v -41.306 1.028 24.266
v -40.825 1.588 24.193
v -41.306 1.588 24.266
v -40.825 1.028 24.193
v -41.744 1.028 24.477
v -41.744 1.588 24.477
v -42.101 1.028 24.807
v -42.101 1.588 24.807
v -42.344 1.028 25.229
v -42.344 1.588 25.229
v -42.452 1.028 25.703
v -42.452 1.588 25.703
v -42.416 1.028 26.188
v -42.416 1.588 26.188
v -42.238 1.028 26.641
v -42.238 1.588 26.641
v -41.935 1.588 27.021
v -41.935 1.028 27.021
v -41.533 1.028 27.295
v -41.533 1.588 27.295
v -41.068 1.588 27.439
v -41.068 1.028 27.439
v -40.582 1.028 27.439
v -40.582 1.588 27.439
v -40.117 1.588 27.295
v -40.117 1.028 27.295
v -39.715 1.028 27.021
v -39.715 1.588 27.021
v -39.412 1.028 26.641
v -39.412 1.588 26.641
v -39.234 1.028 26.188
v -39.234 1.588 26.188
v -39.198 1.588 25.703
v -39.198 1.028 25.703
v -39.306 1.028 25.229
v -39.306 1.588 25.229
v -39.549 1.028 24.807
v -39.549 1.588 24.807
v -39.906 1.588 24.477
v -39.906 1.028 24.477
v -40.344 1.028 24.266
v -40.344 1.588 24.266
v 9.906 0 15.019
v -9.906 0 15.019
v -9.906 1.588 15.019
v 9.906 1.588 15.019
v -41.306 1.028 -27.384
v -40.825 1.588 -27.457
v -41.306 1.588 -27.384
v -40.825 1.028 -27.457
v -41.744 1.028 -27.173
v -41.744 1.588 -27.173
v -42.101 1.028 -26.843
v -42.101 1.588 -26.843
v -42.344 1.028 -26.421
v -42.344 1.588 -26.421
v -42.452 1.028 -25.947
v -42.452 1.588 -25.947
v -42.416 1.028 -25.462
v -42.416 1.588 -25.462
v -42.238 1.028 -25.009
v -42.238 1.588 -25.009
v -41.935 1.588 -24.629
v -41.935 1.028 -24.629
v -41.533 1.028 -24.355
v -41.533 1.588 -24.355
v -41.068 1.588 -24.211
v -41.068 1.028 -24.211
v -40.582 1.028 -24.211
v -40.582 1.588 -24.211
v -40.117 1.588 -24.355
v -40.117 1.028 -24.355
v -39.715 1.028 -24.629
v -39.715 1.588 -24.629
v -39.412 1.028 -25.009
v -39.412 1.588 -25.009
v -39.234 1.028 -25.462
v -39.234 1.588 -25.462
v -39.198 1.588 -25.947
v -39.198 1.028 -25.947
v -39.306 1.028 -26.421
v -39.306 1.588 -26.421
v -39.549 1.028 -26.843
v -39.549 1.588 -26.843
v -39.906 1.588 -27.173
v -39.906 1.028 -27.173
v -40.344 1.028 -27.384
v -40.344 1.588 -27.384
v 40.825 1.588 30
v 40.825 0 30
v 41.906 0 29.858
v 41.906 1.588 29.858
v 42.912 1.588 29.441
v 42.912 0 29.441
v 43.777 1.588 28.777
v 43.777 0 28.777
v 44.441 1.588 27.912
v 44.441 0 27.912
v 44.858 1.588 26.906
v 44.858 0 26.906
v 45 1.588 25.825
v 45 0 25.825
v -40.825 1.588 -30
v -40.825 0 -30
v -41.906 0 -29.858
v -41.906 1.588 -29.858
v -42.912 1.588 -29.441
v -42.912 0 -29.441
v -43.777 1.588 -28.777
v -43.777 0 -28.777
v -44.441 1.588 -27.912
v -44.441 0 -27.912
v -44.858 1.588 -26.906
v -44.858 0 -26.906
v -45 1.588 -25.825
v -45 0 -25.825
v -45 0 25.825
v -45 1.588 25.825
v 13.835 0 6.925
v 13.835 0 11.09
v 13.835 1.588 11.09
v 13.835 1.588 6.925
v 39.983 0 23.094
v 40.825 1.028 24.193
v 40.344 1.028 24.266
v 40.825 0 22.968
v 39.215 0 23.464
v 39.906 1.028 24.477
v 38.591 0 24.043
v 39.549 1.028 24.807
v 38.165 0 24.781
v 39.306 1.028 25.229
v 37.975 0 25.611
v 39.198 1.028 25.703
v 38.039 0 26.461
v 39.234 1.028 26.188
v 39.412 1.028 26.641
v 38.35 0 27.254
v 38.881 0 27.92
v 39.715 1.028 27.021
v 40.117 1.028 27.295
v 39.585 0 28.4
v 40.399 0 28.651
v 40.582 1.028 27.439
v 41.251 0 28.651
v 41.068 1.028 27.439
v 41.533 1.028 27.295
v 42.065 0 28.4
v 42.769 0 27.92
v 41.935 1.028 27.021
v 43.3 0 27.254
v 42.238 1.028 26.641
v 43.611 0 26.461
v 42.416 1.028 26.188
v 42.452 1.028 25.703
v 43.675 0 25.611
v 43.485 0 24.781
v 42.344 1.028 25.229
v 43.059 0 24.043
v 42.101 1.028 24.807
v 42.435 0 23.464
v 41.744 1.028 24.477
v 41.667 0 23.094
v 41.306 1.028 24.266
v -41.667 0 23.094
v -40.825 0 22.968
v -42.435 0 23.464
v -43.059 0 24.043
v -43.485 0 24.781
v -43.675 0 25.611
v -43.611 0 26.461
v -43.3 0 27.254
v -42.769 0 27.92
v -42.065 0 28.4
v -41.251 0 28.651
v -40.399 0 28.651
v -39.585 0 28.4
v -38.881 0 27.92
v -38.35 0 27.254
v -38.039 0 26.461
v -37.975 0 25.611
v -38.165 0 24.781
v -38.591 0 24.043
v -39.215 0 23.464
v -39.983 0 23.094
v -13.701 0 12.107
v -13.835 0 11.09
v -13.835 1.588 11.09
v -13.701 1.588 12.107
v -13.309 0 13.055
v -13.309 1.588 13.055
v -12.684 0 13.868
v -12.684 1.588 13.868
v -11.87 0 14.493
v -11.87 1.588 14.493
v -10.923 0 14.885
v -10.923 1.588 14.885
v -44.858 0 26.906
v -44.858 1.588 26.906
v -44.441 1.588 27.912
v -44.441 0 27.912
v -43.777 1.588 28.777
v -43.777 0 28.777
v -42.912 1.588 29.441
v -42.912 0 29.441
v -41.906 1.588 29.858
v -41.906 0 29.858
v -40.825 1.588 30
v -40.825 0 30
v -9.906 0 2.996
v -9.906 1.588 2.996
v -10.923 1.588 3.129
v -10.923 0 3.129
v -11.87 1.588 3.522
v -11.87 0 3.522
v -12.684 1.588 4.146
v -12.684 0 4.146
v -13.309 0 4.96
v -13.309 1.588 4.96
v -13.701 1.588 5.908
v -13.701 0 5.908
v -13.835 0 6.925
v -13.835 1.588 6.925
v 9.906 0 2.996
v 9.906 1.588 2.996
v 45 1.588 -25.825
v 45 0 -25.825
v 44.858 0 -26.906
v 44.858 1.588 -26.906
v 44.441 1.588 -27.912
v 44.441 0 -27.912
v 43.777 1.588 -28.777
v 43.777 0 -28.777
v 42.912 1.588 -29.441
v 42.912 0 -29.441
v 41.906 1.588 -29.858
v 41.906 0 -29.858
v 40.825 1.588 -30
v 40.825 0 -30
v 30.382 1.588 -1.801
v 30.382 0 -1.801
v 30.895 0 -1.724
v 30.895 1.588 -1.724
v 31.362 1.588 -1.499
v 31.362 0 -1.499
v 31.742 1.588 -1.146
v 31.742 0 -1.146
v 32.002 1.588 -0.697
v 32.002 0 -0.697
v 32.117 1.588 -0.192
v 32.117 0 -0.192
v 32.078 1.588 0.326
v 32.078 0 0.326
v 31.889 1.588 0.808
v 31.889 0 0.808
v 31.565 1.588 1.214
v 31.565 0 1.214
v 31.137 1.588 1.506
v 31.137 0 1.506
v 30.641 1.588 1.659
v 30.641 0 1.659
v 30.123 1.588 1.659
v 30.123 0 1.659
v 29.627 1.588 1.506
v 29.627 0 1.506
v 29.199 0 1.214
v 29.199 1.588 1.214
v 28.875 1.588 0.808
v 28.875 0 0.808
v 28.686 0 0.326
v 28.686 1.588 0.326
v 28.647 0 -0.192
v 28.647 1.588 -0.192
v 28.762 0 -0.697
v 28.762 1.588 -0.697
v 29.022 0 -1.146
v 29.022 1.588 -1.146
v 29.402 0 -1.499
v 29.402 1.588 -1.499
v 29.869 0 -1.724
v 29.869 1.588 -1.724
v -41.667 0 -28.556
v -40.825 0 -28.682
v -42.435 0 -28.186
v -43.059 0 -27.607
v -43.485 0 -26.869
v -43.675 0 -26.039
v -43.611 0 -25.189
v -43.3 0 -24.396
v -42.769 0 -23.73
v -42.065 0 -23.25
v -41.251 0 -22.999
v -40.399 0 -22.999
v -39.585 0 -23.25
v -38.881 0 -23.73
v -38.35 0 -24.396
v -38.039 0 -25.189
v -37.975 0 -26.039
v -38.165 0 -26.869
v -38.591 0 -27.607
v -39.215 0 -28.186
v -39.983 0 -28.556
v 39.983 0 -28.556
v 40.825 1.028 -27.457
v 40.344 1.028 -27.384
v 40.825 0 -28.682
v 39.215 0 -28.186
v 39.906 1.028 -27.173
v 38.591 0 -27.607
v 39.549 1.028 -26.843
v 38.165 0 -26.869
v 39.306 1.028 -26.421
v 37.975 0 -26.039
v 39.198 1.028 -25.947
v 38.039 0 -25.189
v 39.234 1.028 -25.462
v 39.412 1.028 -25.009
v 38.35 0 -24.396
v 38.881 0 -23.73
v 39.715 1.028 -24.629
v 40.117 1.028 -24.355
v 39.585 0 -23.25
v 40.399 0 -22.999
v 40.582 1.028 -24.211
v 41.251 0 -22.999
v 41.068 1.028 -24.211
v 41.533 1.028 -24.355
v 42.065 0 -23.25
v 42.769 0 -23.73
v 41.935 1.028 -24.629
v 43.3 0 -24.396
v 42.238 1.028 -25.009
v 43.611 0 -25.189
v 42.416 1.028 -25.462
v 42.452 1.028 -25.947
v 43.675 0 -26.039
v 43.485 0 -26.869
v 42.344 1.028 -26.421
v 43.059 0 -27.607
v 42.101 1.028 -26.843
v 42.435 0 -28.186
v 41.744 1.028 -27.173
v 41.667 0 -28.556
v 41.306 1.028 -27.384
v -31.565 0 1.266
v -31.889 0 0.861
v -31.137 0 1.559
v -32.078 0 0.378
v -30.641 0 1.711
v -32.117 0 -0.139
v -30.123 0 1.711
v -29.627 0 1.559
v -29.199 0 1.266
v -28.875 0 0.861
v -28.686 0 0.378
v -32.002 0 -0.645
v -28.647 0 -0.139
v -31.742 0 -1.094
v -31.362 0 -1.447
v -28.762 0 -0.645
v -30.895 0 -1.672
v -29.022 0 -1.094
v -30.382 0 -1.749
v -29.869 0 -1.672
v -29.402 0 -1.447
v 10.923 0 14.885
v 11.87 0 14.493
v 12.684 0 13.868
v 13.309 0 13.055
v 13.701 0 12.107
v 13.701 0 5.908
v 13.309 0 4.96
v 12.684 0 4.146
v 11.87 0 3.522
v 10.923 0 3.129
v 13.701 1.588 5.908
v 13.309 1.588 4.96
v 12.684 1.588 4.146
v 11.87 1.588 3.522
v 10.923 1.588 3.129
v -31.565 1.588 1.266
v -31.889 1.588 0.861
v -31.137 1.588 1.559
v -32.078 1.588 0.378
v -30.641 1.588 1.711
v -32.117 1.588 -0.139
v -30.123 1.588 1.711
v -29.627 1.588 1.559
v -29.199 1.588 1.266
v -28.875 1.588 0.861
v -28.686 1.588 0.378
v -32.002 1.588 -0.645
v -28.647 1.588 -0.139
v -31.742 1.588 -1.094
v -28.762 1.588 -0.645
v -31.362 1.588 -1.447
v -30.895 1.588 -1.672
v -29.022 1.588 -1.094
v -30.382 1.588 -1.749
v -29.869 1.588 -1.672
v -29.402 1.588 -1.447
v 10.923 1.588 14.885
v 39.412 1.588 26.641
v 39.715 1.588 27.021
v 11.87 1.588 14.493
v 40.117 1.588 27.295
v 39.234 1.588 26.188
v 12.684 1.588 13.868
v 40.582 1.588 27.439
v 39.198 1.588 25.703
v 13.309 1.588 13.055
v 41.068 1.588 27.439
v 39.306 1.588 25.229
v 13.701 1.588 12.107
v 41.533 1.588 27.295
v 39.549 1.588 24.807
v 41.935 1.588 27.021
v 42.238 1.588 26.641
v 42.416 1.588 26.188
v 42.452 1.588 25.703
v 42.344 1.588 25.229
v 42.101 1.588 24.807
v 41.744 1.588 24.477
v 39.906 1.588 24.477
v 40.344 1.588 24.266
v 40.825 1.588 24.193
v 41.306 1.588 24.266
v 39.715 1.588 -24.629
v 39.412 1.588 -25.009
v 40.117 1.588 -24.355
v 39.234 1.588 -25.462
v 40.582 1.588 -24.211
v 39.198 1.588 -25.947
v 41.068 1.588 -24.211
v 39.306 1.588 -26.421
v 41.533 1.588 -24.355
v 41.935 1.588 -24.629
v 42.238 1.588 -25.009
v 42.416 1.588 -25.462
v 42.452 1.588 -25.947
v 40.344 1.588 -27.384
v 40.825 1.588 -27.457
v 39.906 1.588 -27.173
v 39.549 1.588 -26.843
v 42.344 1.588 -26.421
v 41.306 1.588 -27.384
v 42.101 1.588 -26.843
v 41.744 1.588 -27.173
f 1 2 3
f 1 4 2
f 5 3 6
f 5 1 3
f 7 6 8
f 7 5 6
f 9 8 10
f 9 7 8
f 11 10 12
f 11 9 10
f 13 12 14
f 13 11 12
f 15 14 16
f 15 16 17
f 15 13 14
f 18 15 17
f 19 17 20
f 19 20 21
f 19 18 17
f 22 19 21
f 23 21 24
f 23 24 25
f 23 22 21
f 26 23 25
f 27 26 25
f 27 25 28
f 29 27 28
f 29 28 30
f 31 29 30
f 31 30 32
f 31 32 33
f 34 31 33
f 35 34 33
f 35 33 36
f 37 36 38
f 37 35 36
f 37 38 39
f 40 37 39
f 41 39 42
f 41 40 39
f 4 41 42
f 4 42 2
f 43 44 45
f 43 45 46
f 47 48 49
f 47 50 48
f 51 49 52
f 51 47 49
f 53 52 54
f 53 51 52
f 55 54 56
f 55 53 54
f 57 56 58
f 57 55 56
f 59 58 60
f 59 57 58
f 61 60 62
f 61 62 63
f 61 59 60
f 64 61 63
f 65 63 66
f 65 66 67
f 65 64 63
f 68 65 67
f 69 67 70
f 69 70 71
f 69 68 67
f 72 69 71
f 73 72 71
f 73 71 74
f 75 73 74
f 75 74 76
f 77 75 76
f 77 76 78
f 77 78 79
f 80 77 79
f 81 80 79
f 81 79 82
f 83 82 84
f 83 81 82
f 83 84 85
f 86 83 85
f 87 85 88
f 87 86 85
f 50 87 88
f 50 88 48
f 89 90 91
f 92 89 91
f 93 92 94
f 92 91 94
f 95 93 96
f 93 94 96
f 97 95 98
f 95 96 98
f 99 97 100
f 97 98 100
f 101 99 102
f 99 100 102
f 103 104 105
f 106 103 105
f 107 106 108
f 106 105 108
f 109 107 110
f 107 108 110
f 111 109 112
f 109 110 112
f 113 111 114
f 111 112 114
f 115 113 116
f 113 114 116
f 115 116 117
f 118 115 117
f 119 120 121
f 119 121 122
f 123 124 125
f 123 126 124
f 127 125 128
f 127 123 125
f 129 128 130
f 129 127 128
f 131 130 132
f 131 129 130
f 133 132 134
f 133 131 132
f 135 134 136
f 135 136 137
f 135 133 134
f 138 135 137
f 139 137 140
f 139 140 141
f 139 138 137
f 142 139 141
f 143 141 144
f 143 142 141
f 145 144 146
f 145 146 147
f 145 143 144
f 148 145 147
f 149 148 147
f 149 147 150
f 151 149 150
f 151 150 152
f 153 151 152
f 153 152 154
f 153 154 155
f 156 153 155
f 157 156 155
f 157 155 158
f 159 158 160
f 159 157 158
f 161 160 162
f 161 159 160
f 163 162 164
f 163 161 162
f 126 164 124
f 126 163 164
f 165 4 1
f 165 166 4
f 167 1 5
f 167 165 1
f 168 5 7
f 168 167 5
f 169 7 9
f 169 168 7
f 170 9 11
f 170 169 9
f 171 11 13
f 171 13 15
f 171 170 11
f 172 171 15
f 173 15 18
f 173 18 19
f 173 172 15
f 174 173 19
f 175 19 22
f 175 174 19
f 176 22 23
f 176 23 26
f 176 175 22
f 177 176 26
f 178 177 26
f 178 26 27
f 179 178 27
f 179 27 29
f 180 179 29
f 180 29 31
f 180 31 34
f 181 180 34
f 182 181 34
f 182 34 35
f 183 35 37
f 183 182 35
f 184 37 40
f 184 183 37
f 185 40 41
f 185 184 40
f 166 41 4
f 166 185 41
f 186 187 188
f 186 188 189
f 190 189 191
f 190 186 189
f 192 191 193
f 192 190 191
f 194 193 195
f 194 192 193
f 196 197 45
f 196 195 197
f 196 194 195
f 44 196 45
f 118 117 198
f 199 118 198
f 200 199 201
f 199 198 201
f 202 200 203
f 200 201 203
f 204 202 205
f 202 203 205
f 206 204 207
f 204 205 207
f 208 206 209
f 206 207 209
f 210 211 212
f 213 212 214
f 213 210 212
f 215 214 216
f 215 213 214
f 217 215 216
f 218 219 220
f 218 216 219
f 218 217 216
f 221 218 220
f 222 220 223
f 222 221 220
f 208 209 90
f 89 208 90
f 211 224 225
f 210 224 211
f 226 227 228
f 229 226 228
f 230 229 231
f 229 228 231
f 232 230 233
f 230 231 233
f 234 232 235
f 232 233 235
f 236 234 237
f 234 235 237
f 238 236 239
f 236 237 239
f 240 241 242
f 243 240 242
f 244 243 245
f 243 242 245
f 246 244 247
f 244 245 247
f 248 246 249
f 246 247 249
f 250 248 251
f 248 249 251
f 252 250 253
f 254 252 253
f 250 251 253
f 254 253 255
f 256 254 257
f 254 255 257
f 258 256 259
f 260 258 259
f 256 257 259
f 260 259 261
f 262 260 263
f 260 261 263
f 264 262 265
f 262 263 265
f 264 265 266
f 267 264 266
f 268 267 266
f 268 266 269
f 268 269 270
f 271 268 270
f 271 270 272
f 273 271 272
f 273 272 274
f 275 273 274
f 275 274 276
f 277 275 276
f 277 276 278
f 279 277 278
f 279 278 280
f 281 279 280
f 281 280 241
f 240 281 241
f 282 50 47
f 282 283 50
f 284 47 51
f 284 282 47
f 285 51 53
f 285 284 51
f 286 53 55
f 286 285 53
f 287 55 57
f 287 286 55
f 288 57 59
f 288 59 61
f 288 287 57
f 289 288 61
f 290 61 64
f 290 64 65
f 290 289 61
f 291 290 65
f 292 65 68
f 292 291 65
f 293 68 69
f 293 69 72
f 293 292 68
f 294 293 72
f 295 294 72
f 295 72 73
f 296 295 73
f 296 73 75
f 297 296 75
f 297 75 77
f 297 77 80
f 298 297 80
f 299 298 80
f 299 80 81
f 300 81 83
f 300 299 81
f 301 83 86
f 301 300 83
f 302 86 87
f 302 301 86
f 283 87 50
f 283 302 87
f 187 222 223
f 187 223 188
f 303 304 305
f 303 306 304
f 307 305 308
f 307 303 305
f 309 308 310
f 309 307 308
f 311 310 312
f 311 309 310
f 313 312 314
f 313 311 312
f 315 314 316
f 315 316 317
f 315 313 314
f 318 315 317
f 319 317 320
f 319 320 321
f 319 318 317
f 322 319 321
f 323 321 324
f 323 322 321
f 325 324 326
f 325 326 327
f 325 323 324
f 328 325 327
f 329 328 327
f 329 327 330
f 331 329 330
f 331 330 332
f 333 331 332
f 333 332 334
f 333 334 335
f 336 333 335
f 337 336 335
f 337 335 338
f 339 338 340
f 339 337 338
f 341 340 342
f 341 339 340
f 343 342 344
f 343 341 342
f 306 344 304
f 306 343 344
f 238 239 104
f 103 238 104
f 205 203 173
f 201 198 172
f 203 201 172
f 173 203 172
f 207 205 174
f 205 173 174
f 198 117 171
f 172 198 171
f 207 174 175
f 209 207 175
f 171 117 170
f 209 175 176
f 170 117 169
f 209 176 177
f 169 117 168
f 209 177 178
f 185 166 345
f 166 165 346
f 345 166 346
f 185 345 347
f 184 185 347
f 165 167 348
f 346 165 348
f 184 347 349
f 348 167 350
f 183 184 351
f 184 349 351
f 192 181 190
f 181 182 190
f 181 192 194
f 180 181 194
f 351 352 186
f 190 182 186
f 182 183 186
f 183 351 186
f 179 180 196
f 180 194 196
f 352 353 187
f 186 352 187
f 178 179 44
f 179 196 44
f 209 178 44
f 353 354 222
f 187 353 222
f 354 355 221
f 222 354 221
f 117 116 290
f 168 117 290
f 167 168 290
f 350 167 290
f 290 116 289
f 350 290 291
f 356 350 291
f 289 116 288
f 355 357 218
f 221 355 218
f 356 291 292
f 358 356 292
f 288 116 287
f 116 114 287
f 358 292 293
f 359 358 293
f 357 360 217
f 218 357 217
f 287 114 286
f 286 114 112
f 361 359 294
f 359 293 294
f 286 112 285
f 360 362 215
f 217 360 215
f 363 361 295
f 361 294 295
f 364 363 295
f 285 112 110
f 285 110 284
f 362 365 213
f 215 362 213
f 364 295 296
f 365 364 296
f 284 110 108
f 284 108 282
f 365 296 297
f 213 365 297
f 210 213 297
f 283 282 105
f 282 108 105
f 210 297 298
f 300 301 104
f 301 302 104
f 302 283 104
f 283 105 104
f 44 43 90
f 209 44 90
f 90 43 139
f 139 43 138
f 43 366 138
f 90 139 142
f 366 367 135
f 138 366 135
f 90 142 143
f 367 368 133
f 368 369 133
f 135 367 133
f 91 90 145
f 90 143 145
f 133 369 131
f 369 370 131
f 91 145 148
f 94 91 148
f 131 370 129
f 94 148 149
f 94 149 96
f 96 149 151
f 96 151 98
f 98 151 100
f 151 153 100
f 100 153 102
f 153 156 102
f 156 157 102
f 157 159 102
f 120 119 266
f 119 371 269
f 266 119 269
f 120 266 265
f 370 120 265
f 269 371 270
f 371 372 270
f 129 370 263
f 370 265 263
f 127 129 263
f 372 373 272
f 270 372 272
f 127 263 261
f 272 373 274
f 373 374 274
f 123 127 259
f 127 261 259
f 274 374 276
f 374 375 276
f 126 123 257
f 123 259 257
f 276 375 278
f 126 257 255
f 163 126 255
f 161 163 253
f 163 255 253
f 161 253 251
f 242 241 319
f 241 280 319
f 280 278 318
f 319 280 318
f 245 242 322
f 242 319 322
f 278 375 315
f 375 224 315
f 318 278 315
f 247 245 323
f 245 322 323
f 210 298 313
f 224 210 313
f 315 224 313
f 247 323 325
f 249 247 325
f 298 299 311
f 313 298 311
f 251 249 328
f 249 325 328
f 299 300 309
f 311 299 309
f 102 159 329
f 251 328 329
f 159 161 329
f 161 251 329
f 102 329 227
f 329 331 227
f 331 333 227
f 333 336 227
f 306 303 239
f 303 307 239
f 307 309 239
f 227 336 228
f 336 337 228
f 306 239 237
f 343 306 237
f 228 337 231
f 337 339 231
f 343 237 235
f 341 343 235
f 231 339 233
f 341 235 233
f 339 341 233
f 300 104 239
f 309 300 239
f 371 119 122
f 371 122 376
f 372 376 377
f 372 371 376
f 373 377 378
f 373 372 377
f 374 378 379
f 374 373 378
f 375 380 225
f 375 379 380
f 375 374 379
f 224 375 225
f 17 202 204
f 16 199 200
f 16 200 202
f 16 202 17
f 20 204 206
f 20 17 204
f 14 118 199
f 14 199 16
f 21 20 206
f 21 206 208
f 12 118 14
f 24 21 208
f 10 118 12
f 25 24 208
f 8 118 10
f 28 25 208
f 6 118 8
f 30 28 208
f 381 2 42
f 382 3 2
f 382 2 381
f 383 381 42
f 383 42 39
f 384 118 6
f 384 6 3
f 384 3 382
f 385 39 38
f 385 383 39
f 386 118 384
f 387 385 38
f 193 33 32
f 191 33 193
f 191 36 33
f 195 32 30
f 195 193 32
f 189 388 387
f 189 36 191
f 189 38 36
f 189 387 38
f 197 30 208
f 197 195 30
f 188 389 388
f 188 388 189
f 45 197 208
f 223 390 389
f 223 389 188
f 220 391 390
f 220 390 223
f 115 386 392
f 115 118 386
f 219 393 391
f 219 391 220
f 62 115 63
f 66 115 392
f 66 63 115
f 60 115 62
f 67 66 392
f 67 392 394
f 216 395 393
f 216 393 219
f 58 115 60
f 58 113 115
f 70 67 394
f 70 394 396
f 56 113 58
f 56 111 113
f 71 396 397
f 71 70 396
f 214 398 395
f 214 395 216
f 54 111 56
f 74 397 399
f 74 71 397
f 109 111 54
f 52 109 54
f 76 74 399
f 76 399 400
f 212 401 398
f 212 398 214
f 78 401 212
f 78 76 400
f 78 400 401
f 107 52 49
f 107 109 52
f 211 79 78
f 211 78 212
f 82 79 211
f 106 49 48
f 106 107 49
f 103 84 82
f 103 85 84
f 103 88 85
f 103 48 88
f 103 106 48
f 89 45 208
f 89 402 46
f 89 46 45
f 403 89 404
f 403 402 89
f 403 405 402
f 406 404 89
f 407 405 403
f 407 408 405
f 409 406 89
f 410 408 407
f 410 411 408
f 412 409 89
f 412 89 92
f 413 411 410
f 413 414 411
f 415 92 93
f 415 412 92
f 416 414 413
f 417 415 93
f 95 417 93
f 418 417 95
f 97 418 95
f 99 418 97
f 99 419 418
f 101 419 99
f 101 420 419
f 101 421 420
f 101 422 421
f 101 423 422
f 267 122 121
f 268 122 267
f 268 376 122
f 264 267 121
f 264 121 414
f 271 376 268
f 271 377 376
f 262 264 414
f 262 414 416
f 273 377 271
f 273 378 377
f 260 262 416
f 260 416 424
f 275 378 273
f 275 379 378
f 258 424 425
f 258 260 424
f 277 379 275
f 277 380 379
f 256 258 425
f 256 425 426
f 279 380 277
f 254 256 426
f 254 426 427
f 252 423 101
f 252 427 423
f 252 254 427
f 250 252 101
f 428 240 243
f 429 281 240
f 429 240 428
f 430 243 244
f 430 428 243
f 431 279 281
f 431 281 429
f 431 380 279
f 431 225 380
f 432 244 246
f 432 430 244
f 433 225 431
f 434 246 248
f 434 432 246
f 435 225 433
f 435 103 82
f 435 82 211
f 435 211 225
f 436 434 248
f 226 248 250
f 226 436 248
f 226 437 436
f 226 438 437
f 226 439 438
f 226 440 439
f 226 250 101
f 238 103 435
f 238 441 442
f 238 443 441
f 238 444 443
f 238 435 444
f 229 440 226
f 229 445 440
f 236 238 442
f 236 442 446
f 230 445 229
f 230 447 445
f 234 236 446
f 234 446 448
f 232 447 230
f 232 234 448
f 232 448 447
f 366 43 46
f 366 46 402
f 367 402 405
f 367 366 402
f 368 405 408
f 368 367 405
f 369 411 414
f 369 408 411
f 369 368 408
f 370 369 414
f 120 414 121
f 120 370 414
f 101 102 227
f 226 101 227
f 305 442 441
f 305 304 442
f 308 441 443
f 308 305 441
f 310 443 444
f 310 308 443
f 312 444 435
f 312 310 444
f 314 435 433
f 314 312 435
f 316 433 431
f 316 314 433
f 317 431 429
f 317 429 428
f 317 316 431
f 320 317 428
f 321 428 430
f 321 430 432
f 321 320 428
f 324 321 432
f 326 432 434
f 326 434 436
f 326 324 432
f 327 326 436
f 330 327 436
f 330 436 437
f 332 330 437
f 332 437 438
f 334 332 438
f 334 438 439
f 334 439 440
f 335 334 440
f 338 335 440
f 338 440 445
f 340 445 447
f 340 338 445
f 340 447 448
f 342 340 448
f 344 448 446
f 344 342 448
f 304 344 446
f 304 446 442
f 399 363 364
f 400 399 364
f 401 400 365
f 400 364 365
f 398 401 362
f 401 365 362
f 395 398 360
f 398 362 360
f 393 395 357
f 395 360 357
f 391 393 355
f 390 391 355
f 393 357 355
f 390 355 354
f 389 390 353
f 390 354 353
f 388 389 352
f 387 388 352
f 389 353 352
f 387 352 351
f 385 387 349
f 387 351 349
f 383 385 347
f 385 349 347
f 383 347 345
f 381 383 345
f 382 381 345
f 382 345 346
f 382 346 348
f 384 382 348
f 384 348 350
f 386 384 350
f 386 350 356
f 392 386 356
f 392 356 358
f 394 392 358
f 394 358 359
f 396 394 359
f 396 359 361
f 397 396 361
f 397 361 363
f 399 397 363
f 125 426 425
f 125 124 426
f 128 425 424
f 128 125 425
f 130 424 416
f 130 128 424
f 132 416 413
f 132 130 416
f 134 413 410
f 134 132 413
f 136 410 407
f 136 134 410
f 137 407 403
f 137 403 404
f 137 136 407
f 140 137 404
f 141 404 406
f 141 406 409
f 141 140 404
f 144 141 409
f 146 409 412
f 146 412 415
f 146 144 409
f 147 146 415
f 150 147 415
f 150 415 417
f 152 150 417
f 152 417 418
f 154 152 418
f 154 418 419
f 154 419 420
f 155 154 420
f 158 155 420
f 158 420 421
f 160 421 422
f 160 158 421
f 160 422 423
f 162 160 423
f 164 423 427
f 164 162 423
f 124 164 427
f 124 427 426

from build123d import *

# Parameters (mm, degrees)
SKETCH2_R                                 = 1
BOSS_EXTRUDE3_DEPTH                       = 1.5875
DB15_PLUG_CUTAWAY_DEPTH                   = 55.106562968
CSK_FOR_4_FLAT_HEAD_MACHINE_SCREW_2_COUNT = 2
CSK_FOR_4_FLAT_HEAD_MACHINE_SCREW_2_PITCH = 51.65
CSK_FOR_4_FLAT_HEAD_MACHINE_SCREW_3_COUNT = 2
CSK_FOR_4_FLAT_HEAD_MACHINE_SCREW_3_PITCH = 81.65
CSK_FOR_4_FLAT_HEAD_MACHINE_SCREW_4_COUNT = 2
CSK_FOR_4_FLAT_HEAD_MACHINE_SCREW_4_PITCH = 96.614931558
SKETCH11_R                                = 1.7399
CUT_EXTRUDE1_DEPTH                        = 55.106562968


with BuildPart() as part:
    # Sketch2 → Boss-Extrude3 (new body)
    with BuildSketch(Plane(origin=(0, 0, 0), x_dir=(1, 0, 0), z_dir=(0, 1, 0))):
        with BuildLine():
            Line((-45, 25.825), (-45, -25.825))
            ThreePointArc((-45, -25.825), (-43.777170811, -28.777170811), (-40.825, -30))
            Line((-40.825, -30), (40.825, -30))
            ThreePointArc((40.825, -30), (43.777170811, -28.777170811), (45, -25.825))
            Line((45, -25.825), (45, 25.825))
            ThreePointArc((45, 25.825), (43.777170811, 28.777170811), (40.825, 30))
            Line((40.825, 30), (-40.825, 30))
            ThreePointArc((-40.825, 30), (-43.777170811, 28.777170811), (-45, 25.825))
        make_face()
        with Locations(Location((40.825, 25.825, 0), (0, 0, 270))):
            Circle(SKETCH2_R, mode=Mode.SUBTRACT)
        with Locations(Location((-40.825, 25.825, 0), (0, 0, 270))):
            Circle(SKETCH2_R, mode=Mode.SUBTRACT)
        with Locations(Location((-40.825, -25.825, 0), (0, 0, 270))):
            Circle(SKETCH2_R, mode=Mode.SUBTRACT)
        with Locations(Location((40.825, -25.825, 0), (0, 0, 270))):
            Circle(SKETCH2_R, mode=Mode.SUBTRACT)
    extrude(amount=BOSS_EXTRUDE3_DEPTH)

    # Sketch4 → DB15 Plug Cutaway (cut, through all)
    with BuildSketch(Plane.XZ):
        with BuildLine():
            Line((-13.835, 6.924614493), (-13.835, 11.090214492))
            ThreePointArc((-13.835, 11.090214492), (-12.684222543, 13.868437036), (-9.905999998, 15.019214492))
            Line((-9.905999998, 15.019214492), (9.905999999, 15.019214492))
            ThreePointArc((9.905999999, 15.019214492), (12.684222543, 13.868437035), (13.835, 11.090214492))
            Line((13.835, 11.090214492), (13.835, 6.924614492))
            ThreePointArc((13.835, 6.924614492), (12.684222543, 4.146391949), (9.906, 2.995614492))
            Line((9.906, 2.995614492), (-9.905999998, 2.995614492))
            ThreePointArc((-9.905999998, 2.995614492), (-12.684222543, 4.146391948), (-13.835, 6.924614493))
        make_face()
    extrude(amount=-DB15_PLUG_CUTAWAY_DEPTH, mode=Mode.SUBTRACT)

    # Sketch9 → CSK for #4 Flat Head Machine Screw (100)2 (revolve, cut)
    with BuildSketch(Plane(origin=(-40.825, 0, 25.825), x_dir=(0, 0, -1), z_dir=(1, 0, 0))):
        Polygon((0, 0), (0, 1.5875), (1.63195, 1.5875), (1.63195, 1.028358553), (2.8575, 0), align=None)
    csk_for_4_flat_head_machine_screw_100 = revolve(axis=Axis((-40.825, -6.35, 25.825), (0, 1, 0)), mode=Mode.SUBTRACT)

    # CSK for _4 Flat Head Machine Screw _ 2: CSK for #4 Flat Head Machine Screw (100)2 ×2
    with Locations(*[(0, 0, -i * CSK_FOR_4_FLAT_HEAD_MACHINE_SCREW_2_PITCH) for i in range(1, CSK_FOR_4_FLAT_HEAD_MACHINE_SCREW_2_COUNT)]):
        add(csk_for_4_flat_head_machine_screw_100, mode=Mode.SUBTRACT)

    # CSK for _4 Flat Head Machine Screw _ 3: CSK for #4 Flat Head Machine Screw (100)2 ×2
    with Locations(*[(i * CSK_FOR_4_FLAT_HEAD_MACHINE_SCREW_3_PITCH, 0, 0) for i in range(1, CSK_FOR_4_FLAT_HEAD_MACHINE_SCREW_3_COUNT)]):
        add(csk_for_4_flat_head_machine_screw_100, mode=Mode.SUBTRACT)

    # CSK for _4 Flat Head Machine Screw _ 4: CSK for #4 Flat Head Machine Screw (100)2 ×2
    with Locations(*[Vector(0.8451074661352507, 0, -0.5345964559202167) * (i * CSK_FOR_4_FLAT_HEAD_MACHINE_SCREW_4_PITCH) for i in range(1, CSK_FOR_4_FLAT_HEAD_MACHINE_SCREW_4_COUNT)]):
        add(csk_for_4_flat_head_machine_screw_100, mode=Mode.SUBTRACT)

    # Sketch11 → Cut-Extrude1 (cut, through all)
    with BuildSketch(Plane.XZ):
        with Locations(Location((-30.382, -0.009017528, 0), (0, 0, 270))):
            Circle(SKETCH11_R)
        with Locations(Location((30.382, -0.061487226, 0), (0, 0, 270))):
            Circle(SKETCH11_R)
    extrude(amount=-CUT_EXTRUDE1_DEPTH, mode=Mode.SUBTRACT)


solid = part.part
